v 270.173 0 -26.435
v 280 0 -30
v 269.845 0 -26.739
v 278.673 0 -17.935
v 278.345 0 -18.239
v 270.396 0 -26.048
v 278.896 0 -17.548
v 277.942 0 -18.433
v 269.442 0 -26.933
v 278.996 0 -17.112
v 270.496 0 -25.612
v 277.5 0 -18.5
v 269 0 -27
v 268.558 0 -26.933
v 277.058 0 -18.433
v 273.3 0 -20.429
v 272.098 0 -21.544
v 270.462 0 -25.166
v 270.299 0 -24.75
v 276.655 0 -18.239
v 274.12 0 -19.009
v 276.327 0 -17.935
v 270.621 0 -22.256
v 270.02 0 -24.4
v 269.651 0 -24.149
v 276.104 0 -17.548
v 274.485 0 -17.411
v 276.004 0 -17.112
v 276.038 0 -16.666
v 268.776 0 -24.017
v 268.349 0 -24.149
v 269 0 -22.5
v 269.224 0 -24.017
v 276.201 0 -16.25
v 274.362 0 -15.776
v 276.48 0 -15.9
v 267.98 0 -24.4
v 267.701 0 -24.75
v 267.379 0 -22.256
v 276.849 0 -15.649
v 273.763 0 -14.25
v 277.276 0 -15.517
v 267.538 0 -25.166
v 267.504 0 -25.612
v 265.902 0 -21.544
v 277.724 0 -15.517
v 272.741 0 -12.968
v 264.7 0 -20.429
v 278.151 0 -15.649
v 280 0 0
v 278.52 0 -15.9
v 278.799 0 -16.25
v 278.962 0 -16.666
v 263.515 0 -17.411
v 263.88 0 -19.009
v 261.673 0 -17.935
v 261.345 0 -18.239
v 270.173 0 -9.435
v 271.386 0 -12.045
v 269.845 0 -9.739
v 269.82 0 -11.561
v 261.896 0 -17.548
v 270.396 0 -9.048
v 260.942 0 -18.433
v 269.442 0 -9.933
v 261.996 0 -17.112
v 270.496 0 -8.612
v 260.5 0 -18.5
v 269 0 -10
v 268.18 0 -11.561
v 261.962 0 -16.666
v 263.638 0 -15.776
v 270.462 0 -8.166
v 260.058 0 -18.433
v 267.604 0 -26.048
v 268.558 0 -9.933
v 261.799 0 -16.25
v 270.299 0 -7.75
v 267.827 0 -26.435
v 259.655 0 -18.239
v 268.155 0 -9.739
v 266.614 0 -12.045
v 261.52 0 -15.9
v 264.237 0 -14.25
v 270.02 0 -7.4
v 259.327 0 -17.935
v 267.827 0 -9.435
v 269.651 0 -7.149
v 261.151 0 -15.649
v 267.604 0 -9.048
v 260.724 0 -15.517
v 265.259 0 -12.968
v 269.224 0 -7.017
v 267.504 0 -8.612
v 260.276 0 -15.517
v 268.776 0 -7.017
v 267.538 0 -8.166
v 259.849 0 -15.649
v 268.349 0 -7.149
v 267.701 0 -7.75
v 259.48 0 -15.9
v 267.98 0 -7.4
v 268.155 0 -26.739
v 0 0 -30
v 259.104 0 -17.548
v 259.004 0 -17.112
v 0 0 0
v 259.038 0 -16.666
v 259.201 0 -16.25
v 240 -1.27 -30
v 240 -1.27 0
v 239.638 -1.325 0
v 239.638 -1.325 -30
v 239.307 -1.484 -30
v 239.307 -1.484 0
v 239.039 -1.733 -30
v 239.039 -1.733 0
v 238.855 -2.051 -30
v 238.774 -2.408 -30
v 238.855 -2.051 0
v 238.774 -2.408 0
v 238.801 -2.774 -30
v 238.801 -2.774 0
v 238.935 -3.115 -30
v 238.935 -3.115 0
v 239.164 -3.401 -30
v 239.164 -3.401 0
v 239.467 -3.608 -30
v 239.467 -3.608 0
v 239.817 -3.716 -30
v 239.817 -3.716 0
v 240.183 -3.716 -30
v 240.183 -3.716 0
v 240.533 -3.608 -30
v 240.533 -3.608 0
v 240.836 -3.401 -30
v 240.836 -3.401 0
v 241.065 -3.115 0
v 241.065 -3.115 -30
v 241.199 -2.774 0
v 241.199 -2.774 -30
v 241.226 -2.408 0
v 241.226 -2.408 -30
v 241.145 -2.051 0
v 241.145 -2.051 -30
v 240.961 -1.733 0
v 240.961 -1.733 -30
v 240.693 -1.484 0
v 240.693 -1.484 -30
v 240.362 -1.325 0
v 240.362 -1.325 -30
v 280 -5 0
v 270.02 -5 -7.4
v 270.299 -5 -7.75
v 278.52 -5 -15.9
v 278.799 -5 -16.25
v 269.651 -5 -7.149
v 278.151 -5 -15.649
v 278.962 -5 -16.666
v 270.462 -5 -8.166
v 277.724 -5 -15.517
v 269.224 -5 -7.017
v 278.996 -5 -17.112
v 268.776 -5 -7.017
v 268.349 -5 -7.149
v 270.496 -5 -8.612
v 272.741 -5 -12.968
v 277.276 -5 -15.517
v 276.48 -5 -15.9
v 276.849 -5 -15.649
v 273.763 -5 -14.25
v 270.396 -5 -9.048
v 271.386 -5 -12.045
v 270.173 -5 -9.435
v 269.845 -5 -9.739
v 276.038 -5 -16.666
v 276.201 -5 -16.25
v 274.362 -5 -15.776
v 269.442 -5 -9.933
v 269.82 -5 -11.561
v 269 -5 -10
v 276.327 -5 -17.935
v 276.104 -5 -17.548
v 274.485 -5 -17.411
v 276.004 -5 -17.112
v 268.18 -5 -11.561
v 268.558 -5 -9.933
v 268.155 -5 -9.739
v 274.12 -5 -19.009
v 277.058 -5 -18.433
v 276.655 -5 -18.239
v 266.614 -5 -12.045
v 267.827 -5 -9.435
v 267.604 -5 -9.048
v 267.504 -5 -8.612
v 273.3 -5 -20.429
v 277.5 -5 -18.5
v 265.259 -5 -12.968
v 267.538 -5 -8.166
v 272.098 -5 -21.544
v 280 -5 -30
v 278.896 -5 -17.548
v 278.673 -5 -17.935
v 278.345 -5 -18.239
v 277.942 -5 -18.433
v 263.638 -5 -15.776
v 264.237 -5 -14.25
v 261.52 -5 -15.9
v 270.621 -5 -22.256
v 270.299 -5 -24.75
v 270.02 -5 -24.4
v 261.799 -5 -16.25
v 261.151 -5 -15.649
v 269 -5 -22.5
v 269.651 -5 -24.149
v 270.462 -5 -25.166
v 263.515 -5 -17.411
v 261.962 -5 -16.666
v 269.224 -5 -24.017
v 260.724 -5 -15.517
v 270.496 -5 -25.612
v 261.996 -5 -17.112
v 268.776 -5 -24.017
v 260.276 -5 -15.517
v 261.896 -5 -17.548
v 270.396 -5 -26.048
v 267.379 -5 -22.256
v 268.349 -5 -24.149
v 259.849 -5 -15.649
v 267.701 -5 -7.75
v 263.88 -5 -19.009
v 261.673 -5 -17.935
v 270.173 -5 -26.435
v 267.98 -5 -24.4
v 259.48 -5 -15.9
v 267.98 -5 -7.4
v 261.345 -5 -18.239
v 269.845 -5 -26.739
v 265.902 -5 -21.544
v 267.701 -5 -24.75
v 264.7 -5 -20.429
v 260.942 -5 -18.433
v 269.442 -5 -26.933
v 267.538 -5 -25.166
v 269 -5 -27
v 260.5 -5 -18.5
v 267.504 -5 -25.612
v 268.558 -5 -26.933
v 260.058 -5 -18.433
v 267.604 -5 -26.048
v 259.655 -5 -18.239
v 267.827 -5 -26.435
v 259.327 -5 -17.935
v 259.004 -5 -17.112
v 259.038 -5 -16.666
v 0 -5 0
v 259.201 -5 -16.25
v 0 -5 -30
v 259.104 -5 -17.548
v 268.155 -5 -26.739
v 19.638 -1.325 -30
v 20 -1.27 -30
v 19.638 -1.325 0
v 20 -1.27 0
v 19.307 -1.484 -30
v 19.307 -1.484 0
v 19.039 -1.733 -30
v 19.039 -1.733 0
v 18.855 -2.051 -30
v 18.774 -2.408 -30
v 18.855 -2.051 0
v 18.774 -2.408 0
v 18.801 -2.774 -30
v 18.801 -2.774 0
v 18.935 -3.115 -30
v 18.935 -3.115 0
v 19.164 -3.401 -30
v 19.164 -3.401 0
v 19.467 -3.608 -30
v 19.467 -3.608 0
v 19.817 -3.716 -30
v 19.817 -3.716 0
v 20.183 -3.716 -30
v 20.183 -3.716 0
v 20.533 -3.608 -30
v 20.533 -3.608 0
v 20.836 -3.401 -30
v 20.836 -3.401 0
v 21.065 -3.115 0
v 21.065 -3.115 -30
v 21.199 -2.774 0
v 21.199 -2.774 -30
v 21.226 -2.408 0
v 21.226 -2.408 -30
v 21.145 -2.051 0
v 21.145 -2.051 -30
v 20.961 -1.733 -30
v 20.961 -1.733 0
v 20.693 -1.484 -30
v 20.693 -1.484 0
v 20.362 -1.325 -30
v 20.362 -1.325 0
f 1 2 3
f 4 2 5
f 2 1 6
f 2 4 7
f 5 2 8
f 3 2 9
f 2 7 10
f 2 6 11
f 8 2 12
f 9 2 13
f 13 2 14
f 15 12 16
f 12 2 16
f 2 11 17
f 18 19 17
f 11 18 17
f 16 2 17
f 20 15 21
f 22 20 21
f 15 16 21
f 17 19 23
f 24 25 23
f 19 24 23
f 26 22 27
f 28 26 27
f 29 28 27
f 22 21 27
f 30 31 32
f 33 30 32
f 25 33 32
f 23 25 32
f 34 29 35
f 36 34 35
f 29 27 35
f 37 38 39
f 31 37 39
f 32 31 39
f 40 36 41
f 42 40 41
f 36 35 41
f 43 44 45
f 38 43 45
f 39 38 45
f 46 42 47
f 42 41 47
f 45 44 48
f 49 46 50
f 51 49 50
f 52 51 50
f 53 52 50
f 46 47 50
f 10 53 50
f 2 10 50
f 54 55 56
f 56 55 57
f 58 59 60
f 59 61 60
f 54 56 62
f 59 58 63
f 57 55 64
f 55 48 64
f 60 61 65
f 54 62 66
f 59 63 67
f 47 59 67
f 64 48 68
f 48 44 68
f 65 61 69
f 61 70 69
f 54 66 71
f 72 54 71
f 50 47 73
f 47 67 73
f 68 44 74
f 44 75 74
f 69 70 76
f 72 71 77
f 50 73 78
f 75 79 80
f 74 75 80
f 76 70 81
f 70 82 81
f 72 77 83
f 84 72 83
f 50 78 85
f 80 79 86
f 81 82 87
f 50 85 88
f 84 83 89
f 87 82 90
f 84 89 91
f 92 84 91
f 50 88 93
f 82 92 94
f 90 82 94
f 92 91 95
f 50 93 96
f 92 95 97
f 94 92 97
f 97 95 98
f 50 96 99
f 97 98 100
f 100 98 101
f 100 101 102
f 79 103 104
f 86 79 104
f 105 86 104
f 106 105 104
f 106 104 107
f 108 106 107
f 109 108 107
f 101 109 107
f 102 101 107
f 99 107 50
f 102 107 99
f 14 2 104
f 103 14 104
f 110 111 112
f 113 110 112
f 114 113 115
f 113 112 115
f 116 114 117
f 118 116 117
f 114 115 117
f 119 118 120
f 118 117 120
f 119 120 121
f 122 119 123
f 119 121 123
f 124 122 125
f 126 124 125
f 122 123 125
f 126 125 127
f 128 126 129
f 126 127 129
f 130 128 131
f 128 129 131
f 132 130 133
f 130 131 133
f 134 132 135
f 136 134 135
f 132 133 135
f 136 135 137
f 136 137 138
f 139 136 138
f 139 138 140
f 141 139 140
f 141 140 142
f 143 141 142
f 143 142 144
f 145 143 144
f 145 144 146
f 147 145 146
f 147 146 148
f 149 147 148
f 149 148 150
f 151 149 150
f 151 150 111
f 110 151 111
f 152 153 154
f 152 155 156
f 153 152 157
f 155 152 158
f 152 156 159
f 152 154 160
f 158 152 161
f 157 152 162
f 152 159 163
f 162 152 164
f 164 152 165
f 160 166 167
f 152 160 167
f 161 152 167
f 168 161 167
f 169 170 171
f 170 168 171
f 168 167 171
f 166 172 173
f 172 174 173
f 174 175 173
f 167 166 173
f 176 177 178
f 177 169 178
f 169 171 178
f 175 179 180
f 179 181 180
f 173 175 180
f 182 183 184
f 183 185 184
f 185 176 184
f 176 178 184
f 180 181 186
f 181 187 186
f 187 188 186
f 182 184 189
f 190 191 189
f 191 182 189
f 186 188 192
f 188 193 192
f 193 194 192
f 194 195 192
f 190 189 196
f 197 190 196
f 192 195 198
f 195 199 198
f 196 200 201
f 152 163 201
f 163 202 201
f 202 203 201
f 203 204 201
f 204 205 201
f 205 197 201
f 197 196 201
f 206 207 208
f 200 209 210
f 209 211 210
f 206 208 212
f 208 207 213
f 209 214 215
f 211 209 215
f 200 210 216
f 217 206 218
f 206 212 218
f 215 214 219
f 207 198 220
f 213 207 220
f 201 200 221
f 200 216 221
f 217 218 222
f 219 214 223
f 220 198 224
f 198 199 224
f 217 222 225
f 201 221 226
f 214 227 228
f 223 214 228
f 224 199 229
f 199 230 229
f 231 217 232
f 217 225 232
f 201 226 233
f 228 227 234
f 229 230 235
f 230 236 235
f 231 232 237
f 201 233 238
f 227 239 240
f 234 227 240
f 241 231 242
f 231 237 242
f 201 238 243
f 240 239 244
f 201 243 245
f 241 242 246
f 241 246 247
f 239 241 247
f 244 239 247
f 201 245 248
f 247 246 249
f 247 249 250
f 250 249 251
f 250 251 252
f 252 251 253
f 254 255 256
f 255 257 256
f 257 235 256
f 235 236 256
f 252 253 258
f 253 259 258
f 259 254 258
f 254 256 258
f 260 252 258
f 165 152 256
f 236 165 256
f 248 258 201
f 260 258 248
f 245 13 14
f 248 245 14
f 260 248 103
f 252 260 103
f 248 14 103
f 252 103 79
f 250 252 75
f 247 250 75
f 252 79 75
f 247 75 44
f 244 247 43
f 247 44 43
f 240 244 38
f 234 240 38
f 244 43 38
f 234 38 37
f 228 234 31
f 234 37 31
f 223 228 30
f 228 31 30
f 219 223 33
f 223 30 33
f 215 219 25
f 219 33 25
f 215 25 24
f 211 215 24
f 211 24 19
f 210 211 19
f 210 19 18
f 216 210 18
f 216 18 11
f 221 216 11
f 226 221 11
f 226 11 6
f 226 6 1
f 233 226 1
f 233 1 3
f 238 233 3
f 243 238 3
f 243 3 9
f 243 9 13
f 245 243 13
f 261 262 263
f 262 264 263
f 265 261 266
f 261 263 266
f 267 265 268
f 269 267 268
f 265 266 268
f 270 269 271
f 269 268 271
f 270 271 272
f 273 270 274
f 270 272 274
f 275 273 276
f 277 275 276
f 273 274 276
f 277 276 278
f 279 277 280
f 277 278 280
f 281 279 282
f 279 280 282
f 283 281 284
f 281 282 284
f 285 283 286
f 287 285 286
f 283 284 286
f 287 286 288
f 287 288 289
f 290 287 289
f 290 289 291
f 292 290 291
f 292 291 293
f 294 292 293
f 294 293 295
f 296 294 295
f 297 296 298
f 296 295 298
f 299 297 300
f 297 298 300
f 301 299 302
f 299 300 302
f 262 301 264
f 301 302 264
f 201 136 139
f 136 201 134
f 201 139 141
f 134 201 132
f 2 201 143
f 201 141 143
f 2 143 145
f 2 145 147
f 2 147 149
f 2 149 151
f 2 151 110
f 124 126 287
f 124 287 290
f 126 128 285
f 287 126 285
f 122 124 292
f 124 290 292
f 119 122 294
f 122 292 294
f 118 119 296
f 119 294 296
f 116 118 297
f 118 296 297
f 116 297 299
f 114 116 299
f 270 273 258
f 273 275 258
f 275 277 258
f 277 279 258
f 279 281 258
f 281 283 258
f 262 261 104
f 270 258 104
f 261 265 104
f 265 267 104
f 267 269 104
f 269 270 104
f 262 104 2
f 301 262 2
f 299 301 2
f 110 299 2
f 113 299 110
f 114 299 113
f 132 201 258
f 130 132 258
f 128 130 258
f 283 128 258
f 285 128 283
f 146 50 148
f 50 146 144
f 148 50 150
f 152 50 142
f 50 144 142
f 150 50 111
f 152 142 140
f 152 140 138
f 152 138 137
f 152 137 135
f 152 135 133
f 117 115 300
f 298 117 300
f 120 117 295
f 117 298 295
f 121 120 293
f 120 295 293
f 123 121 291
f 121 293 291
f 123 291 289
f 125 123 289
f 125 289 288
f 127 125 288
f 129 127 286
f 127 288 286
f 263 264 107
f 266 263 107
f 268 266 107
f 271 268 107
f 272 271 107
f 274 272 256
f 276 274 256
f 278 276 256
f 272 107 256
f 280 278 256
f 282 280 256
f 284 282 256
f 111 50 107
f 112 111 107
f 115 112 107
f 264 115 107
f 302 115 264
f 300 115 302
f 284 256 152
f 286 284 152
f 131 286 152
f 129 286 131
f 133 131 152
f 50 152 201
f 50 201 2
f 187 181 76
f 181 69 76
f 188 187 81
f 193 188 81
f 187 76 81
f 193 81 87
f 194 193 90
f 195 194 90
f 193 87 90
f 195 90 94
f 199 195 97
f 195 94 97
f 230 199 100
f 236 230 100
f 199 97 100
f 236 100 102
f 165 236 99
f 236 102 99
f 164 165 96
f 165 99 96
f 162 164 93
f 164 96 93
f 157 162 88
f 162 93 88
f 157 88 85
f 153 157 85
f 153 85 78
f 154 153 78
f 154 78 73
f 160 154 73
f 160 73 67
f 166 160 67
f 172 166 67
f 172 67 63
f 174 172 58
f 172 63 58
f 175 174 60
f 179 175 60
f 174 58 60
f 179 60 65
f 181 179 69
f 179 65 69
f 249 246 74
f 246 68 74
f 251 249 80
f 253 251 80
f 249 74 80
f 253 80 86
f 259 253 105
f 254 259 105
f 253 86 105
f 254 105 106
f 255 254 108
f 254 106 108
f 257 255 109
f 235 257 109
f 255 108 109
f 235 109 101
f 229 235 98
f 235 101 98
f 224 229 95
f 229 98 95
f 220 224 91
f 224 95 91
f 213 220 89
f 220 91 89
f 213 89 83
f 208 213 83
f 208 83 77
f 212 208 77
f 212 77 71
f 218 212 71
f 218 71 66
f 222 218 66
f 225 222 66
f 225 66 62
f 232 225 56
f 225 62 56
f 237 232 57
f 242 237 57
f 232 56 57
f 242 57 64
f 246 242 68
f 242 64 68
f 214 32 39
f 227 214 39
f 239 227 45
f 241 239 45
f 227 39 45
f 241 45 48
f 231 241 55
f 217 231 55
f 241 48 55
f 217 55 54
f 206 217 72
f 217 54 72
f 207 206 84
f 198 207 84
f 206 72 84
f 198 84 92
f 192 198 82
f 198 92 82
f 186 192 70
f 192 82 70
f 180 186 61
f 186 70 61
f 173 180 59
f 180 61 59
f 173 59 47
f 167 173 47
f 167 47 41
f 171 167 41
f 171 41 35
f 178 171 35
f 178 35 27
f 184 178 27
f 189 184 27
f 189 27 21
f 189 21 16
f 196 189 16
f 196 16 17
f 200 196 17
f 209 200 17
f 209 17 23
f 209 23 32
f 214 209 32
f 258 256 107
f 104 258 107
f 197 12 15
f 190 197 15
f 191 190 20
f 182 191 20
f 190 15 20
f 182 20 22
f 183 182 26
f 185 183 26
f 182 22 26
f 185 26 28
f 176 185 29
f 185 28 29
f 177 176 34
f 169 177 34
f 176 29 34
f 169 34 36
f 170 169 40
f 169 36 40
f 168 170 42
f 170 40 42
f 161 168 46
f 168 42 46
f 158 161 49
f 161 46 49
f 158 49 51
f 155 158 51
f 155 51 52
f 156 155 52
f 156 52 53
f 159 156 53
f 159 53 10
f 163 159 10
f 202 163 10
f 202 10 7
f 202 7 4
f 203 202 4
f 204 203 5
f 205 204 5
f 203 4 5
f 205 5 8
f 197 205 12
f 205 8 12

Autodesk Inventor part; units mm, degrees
ref_plane "YZ Plane" through (0, 0, 0) normal (1, 0, 0) x (0, 1, 0)
ref_plane "XZ Plane" through (0, 0, 0) normal (0, 1, 0) x (-1, 0, 0)
ref_plane "XY Plane" through (0, 0, 0) normal (0, 0, 1) x (1, 0, 0)
sketch "スケッチ1" plane through (0, 0, 0) normal (1, 0, 0) x (0, 1, 0)
  line L0 (0, 0) -> (-5, 0)
  line L1 (-5, 0) -> (-5, -30)
  line L2 (-5, -30) -> (0, -30)
  line L3 (0, -30) -> (0, 0)
  dimension "d0" = 30
  dimension "d1" = 5
extrude "押し出し1" add sketch "スケッチ1" along normal blind 280
sketch "スケッチ2" plane through (0, -5, -30) normal (0, -1, 0) x (1, 0, 0)
  line L0 (280, 30) -> (280, 0) projected
  line L1 (0, 0) -> (280, 0) projected
  point P0 (0, 30)
  point P1 (269, 13)
  dimension "d4" = 11
  dimension "d12" = 13
hole "穴1" at (269, -5, -17) direction (0, 1, 0) diameter 11 end through all
sketch "スケッチ4" plane through (280, 0, -30) normal (0, 0, -1) x (-1, 0, 0)
  line L0 (280, 0) -> (0, 0) projected
  line L1 (280, -5) -> (280, 0) projected
  point P0 (260, -2.5)
  point P1 (40, -2.5)
  dimension "d27" = 2.5
  dimension "d28" = 20
  dimension "d36" = 220
hole "穴3" at (20, -2.5, -30) at (240, -2.5, -30) direction (0, 0, 1) diameter 2.459 end through all thread size "M3x0.5" class "6H" standard "ANSI Metric M Profile"
sketch "スケッチ5" plane through (0, -5, -30) normal (0, -1, 0) x (1, 0, 0)
  circle A0 centre (269, 13) radius 5.5 projected
  point P0 (0, 30)
  point P1 (269, 4.5)
  point P2 (277.5, 13)
  point P3 (269, 21.5)
  point P4 (260.5, 13)
  dimension "d39" = 360
  dimension "d41" = 8.5
hole "穴4" at (269, -5, -25.5) at (277.5, -5, -17) at (269, -5, -8.5) at (260.5, -5, -17) direction (0, 1, 0) diameter 3 end through all
properties part number "横長2ndフラットバー" material "アルミニウム 6061"
